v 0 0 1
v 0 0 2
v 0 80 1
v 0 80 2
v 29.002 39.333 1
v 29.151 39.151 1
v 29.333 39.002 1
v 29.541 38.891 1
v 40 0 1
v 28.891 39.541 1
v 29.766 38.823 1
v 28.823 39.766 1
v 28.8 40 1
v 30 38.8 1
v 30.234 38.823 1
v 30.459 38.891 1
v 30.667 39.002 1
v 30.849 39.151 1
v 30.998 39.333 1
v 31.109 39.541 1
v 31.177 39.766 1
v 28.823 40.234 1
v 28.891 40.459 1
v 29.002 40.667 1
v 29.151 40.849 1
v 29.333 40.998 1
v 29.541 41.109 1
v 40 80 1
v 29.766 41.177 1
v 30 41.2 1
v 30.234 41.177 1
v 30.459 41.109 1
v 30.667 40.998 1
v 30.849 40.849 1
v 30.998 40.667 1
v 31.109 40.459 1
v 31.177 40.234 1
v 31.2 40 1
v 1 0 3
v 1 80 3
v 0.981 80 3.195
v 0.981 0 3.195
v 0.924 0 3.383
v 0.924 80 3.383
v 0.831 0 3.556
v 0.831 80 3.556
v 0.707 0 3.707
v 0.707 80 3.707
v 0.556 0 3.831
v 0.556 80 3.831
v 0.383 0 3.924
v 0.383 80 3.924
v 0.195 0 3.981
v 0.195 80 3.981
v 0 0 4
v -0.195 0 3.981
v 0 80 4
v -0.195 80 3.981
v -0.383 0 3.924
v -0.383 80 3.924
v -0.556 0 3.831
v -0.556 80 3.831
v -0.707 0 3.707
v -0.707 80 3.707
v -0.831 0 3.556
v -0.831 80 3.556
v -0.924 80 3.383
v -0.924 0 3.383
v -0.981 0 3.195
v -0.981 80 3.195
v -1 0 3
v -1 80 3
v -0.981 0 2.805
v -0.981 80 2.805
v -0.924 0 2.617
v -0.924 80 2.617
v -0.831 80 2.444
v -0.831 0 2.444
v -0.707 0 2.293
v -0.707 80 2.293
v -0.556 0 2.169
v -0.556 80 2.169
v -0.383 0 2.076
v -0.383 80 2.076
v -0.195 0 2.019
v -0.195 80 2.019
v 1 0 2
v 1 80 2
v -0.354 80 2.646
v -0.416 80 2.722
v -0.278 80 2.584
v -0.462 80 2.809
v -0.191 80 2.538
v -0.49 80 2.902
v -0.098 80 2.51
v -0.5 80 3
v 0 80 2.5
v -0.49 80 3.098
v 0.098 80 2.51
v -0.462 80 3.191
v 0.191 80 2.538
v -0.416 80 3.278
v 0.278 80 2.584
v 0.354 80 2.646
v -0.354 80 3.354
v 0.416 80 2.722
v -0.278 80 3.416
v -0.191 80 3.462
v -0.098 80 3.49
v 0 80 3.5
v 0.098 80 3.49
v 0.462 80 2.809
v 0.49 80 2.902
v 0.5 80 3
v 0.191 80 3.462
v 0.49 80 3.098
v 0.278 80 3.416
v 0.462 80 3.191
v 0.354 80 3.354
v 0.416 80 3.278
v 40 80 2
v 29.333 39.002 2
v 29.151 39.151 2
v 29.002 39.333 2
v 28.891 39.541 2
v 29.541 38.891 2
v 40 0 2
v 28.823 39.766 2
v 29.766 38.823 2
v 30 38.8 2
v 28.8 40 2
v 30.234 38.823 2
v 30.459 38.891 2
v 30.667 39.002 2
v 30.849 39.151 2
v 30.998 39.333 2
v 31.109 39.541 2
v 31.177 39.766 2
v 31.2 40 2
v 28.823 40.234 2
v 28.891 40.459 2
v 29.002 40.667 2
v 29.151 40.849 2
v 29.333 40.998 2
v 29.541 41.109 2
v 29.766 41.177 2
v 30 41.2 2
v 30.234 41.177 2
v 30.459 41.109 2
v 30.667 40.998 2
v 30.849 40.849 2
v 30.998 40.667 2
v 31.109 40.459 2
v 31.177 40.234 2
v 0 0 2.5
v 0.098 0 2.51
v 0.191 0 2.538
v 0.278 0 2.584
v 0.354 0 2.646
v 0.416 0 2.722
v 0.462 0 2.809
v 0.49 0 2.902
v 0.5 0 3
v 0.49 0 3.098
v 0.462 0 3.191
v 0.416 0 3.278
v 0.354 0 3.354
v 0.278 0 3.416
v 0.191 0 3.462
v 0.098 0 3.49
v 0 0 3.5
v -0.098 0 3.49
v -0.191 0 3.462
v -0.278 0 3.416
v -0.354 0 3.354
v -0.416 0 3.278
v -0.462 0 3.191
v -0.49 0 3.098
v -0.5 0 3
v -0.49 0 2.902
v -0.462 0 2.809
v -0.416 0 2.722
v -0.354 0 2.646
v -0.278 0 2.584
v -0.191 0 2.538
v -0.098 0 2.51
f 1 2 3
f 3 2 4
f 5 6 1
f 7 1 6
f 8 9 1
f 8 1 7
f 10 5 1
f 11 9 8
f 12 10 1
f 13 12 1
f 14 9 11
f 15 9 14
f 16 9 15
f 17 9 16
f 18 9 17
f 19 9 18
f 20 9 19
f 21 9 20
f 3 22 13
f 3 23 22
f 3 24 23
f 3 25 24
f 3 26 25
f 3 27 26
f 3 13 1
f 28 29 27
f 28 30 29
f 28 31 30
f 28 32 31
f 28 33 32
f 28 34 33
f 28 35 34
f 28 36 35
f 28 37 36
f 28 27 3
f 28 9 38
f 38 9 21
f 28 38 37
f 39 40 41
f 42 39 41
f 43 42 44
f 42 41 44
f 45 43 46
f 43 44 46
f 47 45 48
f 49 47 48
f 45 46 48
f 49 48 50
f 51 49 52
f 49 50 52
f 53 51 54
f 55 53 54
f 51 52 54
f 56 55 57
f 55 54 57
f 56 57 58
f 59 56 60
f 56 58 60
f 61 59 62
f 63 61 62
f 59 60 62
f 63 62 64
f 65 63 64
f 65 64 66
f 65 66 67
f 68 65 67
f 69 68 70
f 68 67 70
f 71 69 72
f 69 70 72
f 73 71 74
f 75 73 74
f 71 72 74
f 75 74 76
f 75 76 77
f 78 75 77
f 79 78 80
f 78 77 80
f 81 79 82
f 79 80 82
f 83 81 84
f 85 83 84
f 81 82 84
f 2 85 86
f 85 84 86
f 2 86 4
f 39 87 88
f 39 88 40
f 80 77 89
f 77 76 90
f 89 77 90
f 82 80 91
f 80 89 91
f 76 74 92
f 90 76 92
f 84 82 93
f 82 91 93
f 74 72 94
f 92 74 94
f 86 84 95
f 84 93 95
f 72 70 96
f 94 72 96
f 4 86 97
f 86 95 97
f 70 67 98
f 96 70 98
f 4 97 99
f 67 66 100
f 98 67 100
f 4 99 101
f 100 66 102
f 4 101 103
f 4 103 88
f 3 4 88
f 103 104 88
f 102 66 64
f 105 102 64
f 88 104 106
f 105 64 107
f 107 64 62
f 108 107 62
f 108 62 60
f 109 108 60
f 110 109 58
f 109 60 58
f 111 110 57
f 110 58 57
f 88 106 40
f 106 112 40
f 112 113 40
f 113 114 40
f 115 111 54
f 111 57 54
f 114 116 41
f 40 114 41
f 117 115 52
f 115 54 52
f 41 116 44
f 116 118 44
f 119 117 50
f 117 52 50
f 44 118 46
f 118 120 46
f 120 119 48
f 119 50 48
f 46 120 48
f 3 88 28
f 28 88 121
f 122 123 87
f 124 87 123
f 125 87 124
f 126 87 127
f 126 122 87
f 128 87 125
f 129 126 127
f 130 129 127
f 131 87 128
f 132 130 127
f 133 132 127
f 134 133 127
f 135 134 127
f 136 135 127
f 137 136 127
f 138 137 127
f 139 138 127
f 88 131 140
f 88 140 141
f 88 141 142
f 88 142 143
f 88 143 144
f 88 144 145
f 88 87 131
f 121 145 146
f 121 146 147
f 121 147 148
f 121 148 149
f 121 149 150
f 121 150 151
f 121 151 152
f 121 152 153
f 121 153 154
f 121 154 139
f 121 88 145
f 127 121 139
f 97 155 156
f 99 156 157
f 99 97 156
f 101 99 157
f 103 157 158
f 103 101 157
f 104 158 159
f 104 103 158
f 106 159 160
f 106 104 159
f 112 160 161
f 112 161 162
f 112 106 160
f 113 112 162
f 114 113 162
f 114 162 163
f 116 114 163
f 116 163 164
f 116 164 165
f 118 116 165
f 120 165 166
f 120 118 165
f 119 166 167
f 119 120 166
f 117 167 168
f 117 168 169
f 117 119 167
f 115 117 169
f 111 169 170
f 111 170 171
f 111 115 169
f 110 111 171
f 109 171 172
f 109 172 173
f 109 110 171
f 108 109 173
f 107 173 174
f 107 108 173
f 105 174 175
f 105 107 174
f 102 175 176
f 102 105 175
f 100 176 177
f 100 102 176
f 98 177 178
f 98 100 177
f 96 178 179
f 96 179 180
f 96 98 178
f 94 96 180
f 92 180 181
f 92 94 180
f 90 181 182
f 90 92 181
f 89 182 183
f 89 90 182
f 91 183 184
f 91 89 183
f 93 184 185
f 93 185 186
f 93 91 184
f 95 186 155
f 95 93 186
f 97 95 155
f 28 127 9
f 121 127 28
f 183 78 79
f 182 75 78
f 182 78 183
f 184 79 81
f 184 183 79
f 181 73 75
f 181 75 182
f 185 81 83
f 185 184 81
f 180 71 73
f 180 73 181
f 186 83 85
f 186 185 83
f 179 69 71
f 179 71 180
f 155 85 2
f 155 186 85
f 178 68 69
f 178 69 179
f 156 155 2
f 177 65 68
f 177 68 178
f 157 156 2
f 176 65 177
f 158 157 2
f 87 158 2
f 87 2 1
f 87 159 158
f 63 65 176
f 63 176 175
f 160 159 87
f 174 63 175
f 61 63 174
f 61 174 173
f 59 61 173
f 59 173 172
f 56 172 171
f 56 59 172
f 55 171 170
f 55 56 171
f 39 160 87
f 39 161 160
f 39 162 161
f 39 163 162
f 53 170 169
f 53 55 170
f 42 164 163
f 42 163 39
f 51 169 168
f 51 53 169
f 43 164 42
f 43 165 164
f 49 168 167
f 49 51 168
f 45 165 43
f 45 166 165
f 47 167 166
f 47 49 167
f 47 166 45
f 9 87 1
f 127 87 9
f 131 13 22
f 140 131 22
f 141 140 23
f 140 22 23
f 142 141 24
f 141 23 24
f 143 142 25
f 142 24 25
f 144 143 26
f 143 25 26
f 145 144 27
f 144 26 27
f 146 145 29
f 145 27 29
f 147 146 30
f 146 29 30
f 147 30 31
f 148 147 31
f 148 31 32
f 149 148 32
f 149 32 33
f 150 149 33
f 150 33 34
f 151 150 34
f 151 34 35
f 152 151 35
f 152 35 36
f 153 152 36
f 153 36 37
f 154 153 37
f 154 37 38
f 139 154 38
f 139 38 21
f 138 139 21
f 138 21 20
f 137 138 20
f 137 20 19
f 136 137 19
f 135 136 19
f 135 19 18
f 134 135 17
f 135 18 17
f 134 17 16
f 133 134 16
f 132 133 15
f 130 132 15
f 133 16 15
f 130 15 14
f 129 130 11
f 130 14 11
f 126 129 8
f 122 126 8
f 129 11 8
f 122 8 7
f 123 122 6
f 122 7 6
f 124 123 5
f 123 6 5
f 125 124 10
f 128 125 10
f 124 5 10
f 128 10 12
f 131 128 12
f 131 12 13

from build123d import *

# Parameters (mm, degrees)
ESQUISSE1_W             = 40
ESQUISSE1_H             = 80
BOSS_EXTRU_1_DEPTH      = 1
ESQUISSE2_R             = 0.5
BOSS_EXTRU_2_DEPTH      = 80
ESQUISSE3_W             = 3
ESQUISSE3_H             = 80
ENL_V_MAT_EXTRU_1_DEPTH = 90.98333179
D_GAGEMENT_M21_D        = 2.4


with BuildPart() as part:
    # Esquisse1 → Boss.-Extru.1 (new body)
    with BuildSketch(Plane.XY):
        with Locations((20, 40)):
            Rectangle(ESQUISSE1_W, ESQUISSE1_H)
    boss_extru_1 = extrude(amount=BOSS_EXTRU_1_DEPTH)

    # Esquisse2 → Boss.-Extru.2 (add)
    with BuildSketch(Plane(origin=(0, 80, 0), x_dir=(1, 0, 0), z_dir=(0, 1, 0))):
        with BuildLine():
            Line((1, 0), (1, 1))
            ThreePointArc((1, 1), (-0.707106781, 1.707106781), (0, 0))
            Line((0, 0), (1, 0))
        make_face()
        with Locations(Location((0, 1, 0), (0, 0, 270))):
            Circle(ESQUISSE2_R, mode=Mode.SUBTRACT)
    boss_extru_2 = extrude(amount=-BOSS_EXTRU_2_DEPTH)

    # Symétrie2: Boss.-Extru.1, Boss.-Extru.2 across plane
    add(boss_extru_1.mirror(Plane.XY.offset(1)))
    add(boss_extru_2.mirror(Plane.XY.offset(1)))

    # Esquisse3 → Enlèv. mat.-Extru.1 (cut, through all)
    with BuildSketch(Plane(origin=(40, 0, 0), x_dir=(0, 0, -1), z_dir=(1, 0, 0))):
        with Locations((0.5, 40)):
            Rectangle(ESQUISSE3_W, ESQUISSE3_H)
    extrude(amount=-ENL_V_MAT_EXTRU_1_DEPTH, mode=Mode.SUBTRACT)

    # Dégagement M21 (through all)
    with Locations(Plane.XY.offset(2)):
        with Locations((30, 40)):
            Hole(D_GAGEMENT_M21_D / 2)


solid = part.part
